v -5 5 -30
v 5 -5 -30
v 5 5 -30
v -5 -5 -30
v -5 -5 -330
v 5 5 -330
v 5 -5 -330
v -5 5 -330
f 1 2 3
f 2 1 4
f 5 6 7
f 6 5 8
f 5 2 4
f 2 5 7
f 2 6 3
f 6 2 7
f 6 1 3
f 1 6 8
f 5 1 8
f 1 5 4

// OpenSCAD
// Render 10x10mm aluminum extrusion in its assembly position
// Export with: openscad -o stls_in_situ/1010_extrusion.stl render_1010_extrusion.scad

// 1010 aluminum extrusion profile
// Replace this module with a real profile import if desired
module al_1010_extrusion(length=300) {
    // Simple 10x10 cube for now
    // Could be replaced with: import("1010_profile.stl");
    cube([10, 10, length], center=false);
}

// Position: top of extrusion at (0, 0, -30)
// Extrusion is 300mm long, extending downward
translate([-5, -5, -30 - 300])  // center on X/Y, top at z=-30
    al_1010_extrusion(300);
